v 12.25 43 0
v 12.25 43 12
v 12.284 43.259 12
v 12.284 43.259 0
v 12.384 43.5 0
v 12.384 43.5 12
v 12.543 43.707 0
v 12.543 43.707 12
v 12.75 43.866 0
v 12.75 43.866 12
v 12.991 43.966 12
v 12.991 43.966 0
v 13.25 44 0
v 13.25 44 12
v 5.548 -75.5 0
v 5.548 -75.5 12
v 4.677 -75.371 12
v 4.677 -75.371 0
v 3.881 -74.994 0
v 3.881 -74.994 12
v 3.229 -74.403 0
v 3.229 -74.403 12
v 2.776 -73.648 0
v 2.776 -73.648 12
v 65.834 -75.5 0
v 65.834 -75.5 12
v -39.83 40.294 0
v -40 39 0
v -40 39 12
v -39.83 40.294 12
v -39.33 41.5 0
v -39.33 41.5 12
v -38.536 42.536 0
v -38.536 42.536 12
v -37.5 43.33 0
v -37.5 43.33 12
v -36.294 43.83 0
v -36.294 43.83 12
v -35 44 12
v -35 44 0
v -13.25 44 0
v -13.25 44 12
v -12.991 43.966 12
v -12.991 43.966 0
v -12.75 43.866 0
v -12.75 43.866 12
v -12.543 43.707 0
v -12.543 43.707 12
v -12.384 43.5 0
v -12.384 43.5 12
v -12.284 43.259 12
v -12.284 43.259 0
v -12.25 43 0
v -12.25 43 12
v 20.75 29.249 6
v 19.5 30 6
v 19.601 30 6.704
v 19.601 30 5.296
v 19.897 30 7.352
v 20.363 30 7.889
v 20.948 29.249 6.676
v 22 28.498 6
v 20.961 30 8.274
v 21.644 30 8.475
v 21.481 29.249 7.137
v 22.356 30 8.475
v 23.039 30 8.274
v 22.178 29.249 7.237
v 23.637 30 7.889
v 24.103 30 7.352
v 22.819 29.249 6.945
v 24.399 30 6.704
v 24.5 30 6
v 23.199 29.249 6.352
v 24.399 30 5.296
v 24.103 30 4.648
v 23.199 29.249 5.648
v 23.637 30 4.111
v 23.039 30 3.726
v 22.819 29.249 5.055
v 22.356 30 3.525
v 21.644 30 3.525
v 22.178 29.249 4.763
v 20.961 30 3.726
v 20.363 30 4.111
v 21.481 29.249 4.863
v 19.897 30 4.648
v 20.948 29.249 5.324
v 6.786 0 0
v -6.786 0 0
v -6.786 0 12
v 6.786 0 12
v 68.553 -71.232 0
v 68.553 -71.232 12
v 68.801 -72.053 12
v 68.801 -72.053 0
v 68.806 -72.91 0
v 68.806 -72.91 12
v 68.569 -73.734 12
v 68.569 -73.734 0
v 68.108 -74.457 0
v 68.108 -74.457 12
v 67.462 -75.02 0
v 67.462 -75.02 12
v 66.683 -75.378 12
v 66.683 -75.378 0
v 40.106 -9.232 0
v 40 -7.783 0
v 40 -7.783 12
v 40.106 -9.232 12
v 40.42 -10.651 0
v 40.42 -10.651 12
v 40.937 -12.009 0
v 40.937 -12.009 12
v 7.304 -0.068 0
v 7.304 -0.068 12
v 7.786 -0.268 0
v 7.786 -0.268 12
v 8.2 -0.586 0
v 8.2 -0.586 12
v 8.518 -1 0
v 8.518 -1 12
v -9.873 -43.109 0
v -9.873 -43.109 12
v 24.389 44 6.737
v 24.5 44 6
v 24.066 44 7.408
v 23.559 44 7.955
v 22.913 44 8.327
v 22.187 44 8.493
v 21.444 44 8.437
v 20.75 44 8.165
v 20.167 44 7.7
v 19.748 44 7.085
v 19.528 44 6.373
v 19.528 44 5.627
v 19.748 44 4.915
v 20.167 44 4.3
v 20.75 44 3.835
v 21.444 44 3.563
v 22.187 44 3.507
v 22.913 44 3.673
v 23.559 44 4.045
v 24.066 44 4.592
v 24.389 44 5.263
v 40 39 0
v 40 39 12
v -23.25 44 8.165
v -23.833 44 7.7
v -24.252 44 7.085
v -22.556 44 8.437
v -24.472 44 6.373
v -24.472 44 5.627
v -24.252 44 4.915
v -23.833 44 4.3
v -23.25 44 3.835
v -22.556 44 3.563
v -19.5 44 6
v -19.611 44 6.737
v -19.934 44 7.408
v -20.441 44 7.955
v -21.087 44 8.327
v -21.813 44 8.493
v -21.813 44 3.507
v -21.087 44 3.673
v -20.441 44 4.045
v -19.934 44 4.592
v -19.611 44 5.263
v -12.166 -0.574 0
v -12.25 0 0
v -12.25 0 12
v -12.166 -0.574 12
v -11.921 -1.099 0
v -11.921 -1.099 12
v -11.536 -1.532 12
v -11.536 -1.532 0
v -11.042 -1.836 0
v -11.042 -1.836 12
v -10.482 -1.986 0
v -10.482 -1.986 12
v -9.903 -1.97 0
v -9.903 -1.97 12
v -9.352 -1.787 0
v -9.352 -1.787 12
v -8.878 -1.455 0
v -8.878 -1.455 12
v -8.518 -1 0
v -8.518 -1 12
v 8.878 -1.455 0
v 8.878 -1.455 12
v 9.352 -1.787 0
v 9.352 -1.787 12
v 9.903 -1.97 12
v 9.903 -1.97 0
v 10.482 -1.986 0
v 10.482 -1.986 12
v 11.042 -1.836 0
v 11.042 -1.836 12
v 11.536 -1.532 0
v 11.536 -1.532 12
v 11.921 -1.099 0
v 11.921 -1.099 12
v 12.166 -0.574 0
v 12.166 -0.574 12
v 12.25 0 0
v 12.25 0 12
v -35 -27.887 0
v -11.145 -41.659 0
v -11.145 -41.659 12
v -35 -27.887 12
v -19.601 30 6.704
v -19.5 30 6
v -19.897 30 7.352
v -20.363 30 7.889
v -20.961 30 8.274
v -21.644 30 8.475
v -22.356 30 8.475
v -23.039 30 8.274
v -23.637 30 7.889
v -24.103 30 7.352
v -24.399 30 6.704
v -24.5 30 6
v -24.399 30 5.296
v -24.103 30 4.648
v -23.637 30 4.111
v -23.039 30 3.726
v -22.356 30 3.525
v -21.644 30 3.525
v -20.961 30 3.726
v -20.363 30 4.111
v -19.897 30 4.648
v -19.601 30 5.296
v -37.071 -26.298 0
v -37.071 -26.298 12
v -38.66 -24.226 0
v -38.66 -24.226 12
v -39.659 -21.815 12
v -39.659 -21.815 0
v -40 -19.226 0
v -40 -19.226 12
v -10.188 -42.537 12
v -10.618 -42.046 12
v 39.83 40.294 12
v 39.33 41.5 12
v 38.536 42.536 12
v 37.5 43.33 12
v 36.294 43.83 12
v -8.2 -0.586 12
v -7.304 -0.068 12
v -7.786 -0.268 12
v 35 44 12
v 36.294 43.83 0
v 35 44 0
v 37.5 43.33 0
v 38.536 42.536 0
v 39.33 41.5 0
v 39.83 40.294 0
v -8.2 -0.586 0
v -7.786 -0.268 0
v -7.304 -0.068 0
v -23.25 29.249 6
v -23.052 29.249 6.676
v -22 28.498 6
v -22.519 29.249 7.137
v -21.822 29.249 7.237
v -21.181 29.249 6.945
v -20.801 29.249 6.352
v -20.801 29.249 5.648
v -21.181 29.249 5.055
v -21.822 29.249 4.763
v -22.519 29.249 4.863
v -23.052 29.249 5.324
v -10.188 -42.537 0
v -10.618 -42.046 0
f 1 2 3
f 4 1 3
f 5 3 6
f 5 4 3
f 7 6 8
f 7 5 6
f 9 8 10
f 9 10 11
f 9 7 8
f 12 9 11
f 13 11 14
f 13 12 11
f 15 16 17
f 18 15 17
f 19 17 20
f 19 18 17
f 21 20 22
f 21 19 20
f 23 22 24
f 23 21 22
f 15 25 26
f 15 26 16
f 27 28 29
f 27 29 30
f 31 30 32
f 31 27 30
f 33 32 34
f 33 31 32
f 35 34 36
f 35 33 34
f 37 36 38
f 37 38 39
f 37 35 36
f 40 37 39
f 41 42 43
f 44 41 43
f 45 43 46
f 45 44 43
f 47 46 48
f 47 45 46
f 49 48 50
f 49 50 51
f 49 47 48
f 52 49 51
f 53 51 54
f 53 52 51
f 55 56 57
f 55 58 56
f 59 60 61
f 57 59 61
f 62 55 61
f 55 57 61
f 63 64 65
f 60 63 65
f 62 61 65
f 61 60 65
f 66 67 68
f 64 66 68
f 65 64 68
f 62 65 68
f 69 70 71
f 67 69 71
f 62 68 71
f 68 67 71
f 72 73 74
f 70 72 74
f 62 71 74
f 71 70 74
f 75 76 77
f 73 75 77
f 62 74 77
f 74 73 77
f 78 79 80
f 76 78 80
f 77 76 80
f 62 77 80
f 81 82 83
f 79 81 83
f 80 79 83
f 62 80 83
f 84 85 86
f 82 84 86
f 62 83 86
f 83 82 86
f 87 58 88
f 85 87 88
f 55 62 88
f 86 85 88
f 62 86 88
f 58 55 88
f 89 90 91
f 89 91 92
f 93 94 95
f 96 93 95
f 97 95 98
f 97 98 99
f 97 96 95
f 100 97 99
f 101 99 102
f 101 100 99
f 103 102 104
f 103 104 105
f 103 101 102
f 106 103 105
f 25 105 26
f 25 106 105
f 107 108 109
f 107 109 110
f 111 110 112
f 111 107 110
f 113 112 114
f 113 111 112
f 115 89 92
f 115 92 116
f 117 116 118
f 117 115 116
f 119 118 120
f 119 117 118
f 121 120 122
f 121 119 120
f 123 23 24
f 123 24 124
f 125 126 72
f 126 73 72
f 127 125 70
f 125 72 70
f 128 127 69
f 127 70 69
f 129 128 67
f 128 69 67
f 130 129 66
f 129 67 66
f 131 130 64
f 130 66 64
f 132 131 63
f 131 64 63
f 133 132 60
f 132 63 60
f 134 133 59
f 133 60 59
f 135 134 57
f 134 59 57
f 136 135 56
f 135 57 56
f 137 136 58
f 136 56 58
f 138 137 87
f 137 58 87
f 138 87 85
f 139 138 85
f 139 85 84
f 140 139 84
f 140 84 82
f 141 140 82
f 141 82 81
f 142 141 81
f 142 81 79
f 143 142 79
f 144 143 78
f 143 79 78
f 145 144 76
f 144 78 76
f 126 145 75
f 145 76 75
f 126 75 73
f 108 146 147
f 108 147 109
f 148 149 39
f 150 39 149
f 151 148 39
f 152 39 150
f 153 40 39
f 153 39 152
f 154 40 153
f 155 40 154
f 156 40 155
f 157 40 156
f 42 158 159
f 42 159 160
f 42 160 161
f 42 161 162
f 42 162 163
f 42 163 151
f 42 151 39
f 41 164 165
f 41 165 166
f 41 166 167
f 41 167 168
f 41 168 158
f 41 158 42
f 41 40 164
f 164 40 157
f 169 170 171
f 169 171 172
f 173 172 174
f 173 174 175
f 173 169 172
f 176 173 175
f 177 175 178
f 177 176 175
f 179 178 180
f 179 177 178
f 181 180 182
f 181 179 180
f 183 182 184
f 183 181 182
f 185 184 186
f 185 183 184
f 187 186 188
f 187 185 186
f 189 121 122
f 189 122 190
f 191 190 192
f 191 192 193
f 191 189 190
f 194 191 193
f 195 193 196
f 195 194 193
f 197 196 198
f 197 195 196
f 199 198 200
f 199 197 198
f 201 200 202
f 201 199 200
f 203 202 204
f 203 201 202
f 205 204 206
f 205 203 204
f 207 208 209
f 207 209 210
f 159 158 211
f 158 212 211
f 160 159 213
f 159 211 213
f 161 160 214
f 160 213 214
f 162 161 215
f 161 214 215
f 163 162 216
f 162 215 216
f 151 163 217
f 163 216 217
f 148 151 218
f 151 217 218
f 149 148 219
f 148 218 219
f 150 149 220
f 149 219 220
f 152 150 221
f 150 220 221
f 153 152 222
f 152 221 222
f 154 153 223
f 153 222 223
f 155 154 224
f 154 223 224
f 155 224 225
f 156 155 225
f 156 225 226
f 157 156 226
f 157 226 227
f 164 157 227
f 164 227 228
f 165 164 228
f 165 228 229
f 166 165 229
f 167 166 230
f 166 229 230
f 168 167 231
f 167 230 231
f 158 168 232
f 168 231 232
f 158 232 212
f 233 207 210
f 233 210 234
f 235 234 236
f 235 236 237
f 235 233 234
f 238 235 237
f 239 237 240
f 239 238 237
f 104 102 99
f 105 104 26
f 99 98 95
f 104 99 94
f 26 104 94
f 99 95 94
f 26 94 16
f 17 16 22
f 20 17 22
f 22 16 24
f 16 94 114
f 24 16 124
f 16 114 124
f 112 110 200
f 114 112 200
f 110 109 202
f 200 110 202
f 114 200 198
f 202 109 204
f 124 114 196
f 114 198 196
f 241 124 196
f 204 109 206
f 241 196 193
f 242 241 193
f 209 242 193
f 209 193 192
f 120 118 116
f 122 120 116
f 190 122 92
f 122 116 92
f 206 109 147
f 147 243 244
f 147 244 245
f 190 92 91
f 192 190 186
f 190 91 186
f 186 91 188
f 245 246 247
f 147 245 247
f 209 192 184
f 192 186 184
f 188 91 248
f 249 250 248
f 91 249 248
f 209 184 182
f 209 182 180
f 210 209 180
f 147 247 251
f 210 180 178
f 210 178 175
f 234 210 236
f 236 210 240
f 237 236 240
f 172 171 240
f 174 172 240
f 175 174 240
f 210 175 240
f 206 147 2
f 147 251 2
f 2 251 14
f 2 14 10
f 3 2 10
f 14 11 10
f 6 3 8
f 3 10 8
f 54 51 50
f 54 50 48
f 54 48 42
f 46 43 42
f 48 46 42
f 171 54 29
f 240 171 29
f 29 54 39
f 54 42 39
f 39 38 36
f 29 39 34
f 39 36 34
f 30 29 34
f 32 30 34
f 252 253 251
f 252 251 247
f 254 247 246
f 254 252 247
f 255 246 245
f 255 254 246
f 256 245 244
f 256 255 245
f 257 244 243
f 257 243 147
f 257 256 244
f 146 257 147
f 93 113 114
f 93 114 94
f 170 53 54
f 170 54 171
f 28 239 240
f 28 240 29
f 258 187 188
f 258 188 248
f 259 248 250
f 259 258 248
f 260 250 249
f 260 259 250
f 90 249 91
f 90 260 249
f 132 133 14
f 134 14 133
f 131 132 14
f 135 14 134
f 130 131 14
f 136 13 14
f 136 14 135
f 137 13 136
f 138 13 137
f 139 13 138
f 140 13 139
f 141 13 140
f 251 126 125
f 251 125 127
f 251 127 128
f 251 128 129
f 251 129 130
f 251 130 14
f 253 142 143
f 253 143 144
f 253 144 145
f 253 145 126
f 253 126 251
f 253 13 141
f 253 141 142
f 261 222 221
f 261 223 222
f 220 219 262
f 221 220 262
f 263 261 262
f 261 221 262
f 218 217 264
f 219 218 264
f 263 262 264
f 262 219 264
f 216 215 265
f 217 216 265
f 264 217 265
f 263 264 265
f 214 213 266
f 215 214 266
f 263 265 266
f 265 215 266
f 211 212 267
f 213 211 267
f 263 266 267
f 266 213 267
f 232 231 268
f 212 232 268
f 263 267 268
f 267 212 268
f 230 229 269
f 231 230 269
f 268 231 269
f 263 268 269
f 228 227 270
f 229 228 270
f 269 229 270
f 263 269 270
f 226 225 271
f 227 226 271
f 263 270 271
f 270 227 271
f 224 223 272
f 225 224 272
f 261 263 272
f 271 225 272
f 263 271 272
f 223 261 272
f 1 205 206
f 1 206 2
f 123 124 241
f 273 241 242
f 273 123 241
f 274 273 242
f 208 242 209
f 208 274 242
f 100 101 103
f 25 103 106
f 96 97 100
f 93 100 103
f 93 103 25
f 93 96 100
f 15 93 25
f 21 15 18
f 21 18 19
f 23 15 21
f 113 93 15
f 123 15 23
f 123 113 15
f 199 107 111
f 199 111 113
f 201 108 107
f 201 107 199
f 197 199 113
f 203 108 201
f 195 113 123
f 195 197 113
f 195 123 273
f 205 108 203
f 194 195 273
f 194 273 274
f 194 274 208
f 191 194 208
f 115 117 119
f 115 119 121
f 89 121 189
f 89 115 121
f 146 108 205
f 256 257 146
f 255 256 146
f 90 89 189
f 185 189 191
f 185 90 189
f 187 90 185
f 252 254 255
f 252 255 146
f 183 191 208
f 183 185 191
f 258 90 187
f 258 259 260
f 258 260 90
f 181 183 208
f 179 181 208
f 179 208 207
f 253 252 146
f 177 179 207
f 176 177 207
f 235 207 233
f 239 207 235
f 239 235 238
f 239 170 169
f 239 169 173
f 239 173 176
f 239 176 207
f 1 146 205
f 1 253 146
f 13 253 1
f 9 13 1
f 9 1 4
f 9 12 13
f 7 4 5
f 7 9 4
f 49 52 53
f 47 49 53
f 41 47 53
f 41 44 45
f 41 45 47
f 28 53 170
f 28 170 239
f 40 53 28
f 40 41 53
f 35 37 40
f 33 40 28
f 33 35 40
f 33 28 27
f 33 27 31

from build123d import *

# Parameters (mm, degrees)
EXTRUDE1_DEPTH   = 12
F_2_STK_M6_D     = 5
F_2_STK_M6_DEPTH = 14
F_2_STK_M6_TIP   = 1.502151548


with BuildPart() as part:
    # Sketch1 → Extrude1 (new body)
    with BuildSketch(Plane.XY):
        with BuildLine():
            Line((-6.785898385, 0), (6.785898385, 0))
            ThreePointArc((6.785898385, 0), (7.785898385, -0.267949192), (8.517949192, -1))
            ThreePointArc((8.517949192, -1), (10.76763809, -1.931851653), (12.25, 0))
            Line((12.25, 0), (12.25, 43))
            ThreePointArc((12.25, 43), (12.542893219, 43.707106781), (13.25, 44))
            Line((13.25, 44), (35, 44))
            ThreePointArc((35, 44), (38.535533906, 42.535533906), (40, 39))
            Line((40, 39), (40, -7.783053374))
            ThreePointArc((40, -7.783053374), (40.237039929, -9.947449513), (40.93692213, -12.009235991))
            Line((40.93692213, -12.009235991), (68.553018239, -71.232145215))
            ThreePointArc((68.553018239, -71.232145215), (68.364269215, -74.111898825), (65.834094878, -75.5))
            Line((65.834094878, -75.5), (5.547687523, -75.5))
            ThreePointArc((5.547687523, -75.5), (3.880976824, -74.994408837), (2.776048925, -73.648050297))
            Line((2.776048925, -73.648050297), (-9.873472677, -43.109403687))
            ThreePointArc((-9.873472677, -43.109403687), (-10.389591852, -42.279416539), (-11.145111274, -41.659377773))
            Line((-11.145111274, -41.659377773), (-35, -27.886751346))
            ThreePointArc((-35, -27.886751346), (-38.660254038, -24.226497308), (-40, -19.226497308))
            Line((-40, -19.226497308), (-40, 39))
            ThreePointArc((-40, 39), (-38.535533906, 42.535533906), (-35, 44))
            Line((-35, 44), (-13.25, 44))
            ThreePointArc((-13.25, 44), (-12.542893219, 43.707106781), (-12.25, 43))
            Line((-12.25, 43), (-12.25, 0))
            ThreePointArc((-12.25, 0), (-10.76763809, -1.931851653), (-8.517949192, -1))
            ThreePointArc((-8.517949192, -1), (-7.785898385, -0.267949192), (-6.785898385, 0))
        make_face()
    extrude(amount=EXTRUDE1_DEPTH)

    # 2 stk M6
    with Locations(Plane(origin=(0, 44, 0), x_dir=(-1, 0, 0), z_dir=(0, 1, 0))):
        with Locations((-22, 6), (22, 6)):
            Hole(F_2_STK_M6_D / 2, depth=F_2_STK_M6_DEPTH)
            with Locations((0, 0, -(F_2_STK_M6_DEPTH + F_2_STK_M6_TIP / 2))):  # 118° drill point
                Cone(0, F_2_STK_M6_D / 2, F_2_STK_M6_TIP, mode=Mode.SUBTRACT)


solid = part.part
